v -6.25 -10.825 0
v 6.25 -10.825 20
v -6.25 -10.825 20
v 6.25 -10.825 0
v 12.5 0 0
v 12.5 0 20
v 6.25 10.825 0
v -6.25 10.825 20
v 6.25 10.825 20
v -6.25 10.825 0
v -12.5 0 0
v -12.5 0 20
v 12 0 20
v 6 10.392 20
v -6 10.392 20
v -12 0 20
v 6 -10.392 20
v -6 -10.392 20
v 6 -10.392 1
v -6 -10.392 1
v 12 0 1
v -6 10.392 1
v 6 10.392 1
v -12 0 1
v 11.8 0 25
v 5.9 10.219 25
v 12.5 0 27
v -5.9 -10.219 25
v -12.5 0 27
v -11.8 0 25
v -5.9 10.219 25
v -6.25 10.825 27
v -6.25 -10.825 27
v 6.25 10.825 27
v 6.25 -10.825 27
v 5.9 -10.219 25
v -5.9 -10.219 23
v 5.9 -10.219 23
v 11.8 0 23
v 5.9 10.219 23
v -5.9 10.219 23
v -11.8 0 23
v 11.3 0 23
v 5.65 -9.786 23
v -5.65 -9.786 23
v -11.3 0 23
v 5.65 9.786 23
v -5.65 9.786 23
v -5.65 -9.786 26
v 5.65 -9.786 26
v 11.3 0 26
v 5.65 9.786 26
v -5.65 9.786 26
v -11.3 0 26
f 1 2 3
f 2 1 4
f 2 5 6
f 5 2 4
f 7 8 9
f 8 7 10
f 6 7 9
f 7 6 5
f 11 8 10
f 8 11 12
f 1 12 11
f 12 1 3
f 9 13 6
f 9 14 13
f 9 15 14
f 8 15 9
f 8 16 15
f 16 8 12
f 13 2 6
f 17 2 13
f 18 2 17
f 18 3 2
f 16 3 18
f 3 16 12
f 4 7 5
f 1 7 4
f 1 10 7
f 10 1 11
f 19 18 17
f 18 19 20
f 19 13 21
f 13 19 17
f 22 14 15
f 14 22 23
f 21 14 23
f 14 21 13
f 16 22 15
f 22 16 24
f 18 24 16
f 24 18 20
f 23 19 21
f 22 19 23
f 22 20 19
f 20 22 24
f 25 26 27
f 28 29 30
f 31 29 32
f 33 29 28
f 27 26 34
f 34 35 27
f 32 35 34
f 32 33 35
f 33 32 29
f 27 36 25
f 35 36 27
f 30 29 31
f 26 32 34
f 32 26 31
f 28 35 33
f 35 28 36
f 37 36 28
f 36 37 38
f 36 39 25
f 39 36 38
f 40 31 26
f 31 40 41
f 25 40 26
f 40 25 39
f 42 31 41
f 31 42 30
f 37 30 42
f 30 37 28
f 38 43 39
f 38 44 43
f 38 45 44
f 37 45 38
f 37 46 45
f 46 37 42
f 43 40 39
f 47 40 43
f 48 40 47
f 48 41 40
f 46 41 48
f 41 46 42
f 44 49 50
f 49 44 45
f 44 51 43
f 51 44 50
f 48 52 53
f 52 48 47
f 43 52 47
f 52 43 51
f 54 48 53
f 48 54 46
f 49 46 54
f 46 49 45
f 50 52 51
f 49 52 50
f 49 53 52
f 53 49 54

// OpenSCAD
difference() {
    translate([0,0,0])
        cylinder(d=25, h=20, $fn=6);
    translate([0,0,1])
        cylinder(d=25-1, h=20-1, $fn=6);
}

translate([0,0,25]) {
    difference() {
    union() {
        translate([0,0,0])
            cylinder(d1=25-1.4, d2=25, h=2, $fn=6);
        translate([0,0,-2])
            cylinder(d=25-1.4, h=2, $fn=6);
    }
    translate([0,0,-2])
        cylinder(d=25-2.4, h=3, $fn=6);
    }
}
